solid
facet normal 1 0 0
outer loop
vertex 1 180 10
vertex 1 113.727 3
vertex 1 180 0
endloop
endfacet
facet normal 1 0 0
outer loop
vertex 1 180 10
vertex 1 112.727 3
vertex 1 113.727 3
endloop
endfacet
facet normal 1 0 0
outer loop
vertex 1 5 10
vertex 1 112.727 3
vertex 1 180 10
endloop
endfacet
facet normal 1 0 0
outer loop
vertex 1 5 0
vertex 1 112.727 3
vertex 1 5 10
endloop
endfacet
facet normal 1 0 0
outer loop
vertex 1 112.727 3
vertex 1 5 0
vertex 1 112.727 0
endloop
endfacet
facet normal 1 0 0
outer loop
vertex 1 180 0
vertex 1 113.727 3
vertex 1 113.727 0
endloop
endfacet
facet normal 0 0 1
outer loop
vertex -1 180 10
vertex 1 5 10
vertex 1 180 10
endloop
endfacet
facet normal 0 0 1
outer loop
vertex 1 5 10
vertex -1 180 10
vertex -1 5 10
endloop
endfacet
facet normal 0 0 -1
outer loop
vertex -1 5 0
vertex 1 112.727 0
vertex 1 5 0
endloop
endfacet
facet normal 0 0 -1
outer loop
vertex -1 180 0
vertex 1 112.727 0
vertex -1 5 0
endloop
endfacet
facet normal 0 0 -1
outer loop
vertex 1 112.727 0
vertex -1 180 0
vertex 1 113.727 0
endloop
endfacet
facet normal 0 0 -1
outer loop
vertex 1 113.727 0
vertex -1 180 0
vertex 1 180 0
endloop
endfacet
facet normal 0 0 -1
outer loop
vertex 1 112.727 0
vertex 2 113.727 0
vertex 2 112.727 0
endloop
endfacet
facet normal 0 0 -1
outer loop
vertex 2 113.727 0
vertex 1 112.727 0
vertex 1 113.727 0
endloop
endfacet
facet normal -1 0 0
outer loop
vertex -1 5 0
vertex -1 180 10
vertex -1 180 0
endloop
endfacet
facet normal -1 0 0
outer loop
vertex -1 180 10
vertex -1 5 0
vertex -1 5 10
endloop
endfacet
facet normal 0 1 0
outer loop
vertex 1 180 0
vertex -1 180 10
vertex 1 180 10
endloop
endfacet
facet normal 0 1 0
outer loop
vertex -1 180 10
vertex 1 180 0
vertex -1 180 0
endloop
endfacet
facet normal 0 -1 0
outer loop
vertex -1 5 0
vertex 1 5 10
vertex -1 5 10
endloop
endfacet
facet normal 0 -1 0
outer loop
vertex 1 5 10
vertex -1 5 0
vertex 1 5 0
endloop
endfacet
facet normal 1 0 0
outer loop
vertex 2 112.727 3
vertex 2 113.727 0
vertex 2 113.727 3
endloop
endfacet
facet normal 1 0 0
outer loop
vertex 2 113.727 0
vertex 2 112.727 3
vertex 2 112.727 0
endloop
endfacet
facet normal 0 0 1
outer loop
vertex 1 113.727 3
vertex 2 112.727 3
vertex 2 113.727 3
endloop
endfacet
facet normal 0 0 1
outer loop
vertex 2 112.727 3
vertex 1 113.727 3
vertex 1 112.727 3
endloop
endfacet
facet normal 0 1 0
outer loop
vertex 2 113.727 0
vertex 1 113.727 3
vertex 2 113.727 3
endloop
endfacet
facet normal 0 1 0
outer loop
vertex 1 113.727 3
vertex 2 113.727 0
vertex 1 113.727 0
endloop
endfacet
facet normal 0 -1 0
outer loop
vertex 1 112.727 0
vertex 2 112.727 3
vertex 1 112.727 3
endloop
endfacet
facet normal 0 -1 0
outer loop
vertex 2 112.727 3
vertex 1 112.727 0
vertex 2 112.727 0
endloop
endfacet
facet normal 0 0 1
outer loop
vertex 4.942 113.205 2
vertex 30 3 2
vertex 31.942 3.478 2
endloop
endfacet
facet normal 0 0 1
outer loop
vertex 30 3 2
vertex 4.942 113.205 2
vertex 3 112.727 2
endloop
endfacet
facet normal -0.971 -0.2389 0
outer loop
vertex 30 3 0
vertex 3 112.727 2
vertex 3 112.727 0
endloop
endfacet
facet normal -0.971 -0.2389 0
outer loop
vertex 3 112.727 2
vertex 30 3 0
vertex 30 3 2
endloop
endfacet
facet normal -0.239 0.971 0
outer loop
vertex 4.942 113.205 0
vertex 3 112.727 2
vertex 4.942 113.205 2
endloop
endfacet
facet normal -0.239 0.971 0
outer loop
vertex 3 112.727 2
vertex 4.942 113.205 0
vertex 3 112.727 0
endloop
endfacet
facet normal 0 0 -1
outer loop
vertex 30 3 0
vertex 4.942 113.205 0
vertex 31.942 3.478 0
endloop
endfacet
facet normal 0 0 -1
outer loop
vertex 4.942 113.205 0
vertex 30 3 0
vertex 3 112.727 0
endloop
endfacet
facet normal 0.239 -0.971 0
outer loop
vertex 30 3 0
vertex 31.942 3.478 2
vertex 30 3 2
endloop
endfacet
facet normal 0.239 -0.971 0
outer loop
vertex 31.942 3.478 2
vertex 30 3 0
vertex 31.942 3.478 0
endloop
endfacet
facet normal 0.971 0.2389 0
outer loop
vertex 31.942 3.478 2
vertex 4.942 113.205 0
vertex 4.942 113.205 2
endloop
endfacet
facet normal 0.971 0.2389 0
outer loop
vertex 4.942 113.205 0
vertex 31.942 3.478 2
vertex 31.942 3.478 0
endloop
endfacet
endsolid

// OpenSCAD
l1 = 30;

x=3;//6.5//11

ferme = true;
angle = asin((l1-3)/113);



module portail(){
    l2 = 113*cos(angle)+x;
    translate([-1,0,0])cube([2,350/2,10]);
    translate([-1,l2-5,0])cube([3,1,3]);
}

if(ferme){
    translate([0,5,0]) portail();
    translate([l1,x,0]) rotate([0,0,angle]) cube([2,113,2]);
} else {
    translate([0,5,0]) rotate([0,0,-90])portail();
    translate([l1,x,0]) rotate([0,0,-90]) cube([1,77,2]);
}
